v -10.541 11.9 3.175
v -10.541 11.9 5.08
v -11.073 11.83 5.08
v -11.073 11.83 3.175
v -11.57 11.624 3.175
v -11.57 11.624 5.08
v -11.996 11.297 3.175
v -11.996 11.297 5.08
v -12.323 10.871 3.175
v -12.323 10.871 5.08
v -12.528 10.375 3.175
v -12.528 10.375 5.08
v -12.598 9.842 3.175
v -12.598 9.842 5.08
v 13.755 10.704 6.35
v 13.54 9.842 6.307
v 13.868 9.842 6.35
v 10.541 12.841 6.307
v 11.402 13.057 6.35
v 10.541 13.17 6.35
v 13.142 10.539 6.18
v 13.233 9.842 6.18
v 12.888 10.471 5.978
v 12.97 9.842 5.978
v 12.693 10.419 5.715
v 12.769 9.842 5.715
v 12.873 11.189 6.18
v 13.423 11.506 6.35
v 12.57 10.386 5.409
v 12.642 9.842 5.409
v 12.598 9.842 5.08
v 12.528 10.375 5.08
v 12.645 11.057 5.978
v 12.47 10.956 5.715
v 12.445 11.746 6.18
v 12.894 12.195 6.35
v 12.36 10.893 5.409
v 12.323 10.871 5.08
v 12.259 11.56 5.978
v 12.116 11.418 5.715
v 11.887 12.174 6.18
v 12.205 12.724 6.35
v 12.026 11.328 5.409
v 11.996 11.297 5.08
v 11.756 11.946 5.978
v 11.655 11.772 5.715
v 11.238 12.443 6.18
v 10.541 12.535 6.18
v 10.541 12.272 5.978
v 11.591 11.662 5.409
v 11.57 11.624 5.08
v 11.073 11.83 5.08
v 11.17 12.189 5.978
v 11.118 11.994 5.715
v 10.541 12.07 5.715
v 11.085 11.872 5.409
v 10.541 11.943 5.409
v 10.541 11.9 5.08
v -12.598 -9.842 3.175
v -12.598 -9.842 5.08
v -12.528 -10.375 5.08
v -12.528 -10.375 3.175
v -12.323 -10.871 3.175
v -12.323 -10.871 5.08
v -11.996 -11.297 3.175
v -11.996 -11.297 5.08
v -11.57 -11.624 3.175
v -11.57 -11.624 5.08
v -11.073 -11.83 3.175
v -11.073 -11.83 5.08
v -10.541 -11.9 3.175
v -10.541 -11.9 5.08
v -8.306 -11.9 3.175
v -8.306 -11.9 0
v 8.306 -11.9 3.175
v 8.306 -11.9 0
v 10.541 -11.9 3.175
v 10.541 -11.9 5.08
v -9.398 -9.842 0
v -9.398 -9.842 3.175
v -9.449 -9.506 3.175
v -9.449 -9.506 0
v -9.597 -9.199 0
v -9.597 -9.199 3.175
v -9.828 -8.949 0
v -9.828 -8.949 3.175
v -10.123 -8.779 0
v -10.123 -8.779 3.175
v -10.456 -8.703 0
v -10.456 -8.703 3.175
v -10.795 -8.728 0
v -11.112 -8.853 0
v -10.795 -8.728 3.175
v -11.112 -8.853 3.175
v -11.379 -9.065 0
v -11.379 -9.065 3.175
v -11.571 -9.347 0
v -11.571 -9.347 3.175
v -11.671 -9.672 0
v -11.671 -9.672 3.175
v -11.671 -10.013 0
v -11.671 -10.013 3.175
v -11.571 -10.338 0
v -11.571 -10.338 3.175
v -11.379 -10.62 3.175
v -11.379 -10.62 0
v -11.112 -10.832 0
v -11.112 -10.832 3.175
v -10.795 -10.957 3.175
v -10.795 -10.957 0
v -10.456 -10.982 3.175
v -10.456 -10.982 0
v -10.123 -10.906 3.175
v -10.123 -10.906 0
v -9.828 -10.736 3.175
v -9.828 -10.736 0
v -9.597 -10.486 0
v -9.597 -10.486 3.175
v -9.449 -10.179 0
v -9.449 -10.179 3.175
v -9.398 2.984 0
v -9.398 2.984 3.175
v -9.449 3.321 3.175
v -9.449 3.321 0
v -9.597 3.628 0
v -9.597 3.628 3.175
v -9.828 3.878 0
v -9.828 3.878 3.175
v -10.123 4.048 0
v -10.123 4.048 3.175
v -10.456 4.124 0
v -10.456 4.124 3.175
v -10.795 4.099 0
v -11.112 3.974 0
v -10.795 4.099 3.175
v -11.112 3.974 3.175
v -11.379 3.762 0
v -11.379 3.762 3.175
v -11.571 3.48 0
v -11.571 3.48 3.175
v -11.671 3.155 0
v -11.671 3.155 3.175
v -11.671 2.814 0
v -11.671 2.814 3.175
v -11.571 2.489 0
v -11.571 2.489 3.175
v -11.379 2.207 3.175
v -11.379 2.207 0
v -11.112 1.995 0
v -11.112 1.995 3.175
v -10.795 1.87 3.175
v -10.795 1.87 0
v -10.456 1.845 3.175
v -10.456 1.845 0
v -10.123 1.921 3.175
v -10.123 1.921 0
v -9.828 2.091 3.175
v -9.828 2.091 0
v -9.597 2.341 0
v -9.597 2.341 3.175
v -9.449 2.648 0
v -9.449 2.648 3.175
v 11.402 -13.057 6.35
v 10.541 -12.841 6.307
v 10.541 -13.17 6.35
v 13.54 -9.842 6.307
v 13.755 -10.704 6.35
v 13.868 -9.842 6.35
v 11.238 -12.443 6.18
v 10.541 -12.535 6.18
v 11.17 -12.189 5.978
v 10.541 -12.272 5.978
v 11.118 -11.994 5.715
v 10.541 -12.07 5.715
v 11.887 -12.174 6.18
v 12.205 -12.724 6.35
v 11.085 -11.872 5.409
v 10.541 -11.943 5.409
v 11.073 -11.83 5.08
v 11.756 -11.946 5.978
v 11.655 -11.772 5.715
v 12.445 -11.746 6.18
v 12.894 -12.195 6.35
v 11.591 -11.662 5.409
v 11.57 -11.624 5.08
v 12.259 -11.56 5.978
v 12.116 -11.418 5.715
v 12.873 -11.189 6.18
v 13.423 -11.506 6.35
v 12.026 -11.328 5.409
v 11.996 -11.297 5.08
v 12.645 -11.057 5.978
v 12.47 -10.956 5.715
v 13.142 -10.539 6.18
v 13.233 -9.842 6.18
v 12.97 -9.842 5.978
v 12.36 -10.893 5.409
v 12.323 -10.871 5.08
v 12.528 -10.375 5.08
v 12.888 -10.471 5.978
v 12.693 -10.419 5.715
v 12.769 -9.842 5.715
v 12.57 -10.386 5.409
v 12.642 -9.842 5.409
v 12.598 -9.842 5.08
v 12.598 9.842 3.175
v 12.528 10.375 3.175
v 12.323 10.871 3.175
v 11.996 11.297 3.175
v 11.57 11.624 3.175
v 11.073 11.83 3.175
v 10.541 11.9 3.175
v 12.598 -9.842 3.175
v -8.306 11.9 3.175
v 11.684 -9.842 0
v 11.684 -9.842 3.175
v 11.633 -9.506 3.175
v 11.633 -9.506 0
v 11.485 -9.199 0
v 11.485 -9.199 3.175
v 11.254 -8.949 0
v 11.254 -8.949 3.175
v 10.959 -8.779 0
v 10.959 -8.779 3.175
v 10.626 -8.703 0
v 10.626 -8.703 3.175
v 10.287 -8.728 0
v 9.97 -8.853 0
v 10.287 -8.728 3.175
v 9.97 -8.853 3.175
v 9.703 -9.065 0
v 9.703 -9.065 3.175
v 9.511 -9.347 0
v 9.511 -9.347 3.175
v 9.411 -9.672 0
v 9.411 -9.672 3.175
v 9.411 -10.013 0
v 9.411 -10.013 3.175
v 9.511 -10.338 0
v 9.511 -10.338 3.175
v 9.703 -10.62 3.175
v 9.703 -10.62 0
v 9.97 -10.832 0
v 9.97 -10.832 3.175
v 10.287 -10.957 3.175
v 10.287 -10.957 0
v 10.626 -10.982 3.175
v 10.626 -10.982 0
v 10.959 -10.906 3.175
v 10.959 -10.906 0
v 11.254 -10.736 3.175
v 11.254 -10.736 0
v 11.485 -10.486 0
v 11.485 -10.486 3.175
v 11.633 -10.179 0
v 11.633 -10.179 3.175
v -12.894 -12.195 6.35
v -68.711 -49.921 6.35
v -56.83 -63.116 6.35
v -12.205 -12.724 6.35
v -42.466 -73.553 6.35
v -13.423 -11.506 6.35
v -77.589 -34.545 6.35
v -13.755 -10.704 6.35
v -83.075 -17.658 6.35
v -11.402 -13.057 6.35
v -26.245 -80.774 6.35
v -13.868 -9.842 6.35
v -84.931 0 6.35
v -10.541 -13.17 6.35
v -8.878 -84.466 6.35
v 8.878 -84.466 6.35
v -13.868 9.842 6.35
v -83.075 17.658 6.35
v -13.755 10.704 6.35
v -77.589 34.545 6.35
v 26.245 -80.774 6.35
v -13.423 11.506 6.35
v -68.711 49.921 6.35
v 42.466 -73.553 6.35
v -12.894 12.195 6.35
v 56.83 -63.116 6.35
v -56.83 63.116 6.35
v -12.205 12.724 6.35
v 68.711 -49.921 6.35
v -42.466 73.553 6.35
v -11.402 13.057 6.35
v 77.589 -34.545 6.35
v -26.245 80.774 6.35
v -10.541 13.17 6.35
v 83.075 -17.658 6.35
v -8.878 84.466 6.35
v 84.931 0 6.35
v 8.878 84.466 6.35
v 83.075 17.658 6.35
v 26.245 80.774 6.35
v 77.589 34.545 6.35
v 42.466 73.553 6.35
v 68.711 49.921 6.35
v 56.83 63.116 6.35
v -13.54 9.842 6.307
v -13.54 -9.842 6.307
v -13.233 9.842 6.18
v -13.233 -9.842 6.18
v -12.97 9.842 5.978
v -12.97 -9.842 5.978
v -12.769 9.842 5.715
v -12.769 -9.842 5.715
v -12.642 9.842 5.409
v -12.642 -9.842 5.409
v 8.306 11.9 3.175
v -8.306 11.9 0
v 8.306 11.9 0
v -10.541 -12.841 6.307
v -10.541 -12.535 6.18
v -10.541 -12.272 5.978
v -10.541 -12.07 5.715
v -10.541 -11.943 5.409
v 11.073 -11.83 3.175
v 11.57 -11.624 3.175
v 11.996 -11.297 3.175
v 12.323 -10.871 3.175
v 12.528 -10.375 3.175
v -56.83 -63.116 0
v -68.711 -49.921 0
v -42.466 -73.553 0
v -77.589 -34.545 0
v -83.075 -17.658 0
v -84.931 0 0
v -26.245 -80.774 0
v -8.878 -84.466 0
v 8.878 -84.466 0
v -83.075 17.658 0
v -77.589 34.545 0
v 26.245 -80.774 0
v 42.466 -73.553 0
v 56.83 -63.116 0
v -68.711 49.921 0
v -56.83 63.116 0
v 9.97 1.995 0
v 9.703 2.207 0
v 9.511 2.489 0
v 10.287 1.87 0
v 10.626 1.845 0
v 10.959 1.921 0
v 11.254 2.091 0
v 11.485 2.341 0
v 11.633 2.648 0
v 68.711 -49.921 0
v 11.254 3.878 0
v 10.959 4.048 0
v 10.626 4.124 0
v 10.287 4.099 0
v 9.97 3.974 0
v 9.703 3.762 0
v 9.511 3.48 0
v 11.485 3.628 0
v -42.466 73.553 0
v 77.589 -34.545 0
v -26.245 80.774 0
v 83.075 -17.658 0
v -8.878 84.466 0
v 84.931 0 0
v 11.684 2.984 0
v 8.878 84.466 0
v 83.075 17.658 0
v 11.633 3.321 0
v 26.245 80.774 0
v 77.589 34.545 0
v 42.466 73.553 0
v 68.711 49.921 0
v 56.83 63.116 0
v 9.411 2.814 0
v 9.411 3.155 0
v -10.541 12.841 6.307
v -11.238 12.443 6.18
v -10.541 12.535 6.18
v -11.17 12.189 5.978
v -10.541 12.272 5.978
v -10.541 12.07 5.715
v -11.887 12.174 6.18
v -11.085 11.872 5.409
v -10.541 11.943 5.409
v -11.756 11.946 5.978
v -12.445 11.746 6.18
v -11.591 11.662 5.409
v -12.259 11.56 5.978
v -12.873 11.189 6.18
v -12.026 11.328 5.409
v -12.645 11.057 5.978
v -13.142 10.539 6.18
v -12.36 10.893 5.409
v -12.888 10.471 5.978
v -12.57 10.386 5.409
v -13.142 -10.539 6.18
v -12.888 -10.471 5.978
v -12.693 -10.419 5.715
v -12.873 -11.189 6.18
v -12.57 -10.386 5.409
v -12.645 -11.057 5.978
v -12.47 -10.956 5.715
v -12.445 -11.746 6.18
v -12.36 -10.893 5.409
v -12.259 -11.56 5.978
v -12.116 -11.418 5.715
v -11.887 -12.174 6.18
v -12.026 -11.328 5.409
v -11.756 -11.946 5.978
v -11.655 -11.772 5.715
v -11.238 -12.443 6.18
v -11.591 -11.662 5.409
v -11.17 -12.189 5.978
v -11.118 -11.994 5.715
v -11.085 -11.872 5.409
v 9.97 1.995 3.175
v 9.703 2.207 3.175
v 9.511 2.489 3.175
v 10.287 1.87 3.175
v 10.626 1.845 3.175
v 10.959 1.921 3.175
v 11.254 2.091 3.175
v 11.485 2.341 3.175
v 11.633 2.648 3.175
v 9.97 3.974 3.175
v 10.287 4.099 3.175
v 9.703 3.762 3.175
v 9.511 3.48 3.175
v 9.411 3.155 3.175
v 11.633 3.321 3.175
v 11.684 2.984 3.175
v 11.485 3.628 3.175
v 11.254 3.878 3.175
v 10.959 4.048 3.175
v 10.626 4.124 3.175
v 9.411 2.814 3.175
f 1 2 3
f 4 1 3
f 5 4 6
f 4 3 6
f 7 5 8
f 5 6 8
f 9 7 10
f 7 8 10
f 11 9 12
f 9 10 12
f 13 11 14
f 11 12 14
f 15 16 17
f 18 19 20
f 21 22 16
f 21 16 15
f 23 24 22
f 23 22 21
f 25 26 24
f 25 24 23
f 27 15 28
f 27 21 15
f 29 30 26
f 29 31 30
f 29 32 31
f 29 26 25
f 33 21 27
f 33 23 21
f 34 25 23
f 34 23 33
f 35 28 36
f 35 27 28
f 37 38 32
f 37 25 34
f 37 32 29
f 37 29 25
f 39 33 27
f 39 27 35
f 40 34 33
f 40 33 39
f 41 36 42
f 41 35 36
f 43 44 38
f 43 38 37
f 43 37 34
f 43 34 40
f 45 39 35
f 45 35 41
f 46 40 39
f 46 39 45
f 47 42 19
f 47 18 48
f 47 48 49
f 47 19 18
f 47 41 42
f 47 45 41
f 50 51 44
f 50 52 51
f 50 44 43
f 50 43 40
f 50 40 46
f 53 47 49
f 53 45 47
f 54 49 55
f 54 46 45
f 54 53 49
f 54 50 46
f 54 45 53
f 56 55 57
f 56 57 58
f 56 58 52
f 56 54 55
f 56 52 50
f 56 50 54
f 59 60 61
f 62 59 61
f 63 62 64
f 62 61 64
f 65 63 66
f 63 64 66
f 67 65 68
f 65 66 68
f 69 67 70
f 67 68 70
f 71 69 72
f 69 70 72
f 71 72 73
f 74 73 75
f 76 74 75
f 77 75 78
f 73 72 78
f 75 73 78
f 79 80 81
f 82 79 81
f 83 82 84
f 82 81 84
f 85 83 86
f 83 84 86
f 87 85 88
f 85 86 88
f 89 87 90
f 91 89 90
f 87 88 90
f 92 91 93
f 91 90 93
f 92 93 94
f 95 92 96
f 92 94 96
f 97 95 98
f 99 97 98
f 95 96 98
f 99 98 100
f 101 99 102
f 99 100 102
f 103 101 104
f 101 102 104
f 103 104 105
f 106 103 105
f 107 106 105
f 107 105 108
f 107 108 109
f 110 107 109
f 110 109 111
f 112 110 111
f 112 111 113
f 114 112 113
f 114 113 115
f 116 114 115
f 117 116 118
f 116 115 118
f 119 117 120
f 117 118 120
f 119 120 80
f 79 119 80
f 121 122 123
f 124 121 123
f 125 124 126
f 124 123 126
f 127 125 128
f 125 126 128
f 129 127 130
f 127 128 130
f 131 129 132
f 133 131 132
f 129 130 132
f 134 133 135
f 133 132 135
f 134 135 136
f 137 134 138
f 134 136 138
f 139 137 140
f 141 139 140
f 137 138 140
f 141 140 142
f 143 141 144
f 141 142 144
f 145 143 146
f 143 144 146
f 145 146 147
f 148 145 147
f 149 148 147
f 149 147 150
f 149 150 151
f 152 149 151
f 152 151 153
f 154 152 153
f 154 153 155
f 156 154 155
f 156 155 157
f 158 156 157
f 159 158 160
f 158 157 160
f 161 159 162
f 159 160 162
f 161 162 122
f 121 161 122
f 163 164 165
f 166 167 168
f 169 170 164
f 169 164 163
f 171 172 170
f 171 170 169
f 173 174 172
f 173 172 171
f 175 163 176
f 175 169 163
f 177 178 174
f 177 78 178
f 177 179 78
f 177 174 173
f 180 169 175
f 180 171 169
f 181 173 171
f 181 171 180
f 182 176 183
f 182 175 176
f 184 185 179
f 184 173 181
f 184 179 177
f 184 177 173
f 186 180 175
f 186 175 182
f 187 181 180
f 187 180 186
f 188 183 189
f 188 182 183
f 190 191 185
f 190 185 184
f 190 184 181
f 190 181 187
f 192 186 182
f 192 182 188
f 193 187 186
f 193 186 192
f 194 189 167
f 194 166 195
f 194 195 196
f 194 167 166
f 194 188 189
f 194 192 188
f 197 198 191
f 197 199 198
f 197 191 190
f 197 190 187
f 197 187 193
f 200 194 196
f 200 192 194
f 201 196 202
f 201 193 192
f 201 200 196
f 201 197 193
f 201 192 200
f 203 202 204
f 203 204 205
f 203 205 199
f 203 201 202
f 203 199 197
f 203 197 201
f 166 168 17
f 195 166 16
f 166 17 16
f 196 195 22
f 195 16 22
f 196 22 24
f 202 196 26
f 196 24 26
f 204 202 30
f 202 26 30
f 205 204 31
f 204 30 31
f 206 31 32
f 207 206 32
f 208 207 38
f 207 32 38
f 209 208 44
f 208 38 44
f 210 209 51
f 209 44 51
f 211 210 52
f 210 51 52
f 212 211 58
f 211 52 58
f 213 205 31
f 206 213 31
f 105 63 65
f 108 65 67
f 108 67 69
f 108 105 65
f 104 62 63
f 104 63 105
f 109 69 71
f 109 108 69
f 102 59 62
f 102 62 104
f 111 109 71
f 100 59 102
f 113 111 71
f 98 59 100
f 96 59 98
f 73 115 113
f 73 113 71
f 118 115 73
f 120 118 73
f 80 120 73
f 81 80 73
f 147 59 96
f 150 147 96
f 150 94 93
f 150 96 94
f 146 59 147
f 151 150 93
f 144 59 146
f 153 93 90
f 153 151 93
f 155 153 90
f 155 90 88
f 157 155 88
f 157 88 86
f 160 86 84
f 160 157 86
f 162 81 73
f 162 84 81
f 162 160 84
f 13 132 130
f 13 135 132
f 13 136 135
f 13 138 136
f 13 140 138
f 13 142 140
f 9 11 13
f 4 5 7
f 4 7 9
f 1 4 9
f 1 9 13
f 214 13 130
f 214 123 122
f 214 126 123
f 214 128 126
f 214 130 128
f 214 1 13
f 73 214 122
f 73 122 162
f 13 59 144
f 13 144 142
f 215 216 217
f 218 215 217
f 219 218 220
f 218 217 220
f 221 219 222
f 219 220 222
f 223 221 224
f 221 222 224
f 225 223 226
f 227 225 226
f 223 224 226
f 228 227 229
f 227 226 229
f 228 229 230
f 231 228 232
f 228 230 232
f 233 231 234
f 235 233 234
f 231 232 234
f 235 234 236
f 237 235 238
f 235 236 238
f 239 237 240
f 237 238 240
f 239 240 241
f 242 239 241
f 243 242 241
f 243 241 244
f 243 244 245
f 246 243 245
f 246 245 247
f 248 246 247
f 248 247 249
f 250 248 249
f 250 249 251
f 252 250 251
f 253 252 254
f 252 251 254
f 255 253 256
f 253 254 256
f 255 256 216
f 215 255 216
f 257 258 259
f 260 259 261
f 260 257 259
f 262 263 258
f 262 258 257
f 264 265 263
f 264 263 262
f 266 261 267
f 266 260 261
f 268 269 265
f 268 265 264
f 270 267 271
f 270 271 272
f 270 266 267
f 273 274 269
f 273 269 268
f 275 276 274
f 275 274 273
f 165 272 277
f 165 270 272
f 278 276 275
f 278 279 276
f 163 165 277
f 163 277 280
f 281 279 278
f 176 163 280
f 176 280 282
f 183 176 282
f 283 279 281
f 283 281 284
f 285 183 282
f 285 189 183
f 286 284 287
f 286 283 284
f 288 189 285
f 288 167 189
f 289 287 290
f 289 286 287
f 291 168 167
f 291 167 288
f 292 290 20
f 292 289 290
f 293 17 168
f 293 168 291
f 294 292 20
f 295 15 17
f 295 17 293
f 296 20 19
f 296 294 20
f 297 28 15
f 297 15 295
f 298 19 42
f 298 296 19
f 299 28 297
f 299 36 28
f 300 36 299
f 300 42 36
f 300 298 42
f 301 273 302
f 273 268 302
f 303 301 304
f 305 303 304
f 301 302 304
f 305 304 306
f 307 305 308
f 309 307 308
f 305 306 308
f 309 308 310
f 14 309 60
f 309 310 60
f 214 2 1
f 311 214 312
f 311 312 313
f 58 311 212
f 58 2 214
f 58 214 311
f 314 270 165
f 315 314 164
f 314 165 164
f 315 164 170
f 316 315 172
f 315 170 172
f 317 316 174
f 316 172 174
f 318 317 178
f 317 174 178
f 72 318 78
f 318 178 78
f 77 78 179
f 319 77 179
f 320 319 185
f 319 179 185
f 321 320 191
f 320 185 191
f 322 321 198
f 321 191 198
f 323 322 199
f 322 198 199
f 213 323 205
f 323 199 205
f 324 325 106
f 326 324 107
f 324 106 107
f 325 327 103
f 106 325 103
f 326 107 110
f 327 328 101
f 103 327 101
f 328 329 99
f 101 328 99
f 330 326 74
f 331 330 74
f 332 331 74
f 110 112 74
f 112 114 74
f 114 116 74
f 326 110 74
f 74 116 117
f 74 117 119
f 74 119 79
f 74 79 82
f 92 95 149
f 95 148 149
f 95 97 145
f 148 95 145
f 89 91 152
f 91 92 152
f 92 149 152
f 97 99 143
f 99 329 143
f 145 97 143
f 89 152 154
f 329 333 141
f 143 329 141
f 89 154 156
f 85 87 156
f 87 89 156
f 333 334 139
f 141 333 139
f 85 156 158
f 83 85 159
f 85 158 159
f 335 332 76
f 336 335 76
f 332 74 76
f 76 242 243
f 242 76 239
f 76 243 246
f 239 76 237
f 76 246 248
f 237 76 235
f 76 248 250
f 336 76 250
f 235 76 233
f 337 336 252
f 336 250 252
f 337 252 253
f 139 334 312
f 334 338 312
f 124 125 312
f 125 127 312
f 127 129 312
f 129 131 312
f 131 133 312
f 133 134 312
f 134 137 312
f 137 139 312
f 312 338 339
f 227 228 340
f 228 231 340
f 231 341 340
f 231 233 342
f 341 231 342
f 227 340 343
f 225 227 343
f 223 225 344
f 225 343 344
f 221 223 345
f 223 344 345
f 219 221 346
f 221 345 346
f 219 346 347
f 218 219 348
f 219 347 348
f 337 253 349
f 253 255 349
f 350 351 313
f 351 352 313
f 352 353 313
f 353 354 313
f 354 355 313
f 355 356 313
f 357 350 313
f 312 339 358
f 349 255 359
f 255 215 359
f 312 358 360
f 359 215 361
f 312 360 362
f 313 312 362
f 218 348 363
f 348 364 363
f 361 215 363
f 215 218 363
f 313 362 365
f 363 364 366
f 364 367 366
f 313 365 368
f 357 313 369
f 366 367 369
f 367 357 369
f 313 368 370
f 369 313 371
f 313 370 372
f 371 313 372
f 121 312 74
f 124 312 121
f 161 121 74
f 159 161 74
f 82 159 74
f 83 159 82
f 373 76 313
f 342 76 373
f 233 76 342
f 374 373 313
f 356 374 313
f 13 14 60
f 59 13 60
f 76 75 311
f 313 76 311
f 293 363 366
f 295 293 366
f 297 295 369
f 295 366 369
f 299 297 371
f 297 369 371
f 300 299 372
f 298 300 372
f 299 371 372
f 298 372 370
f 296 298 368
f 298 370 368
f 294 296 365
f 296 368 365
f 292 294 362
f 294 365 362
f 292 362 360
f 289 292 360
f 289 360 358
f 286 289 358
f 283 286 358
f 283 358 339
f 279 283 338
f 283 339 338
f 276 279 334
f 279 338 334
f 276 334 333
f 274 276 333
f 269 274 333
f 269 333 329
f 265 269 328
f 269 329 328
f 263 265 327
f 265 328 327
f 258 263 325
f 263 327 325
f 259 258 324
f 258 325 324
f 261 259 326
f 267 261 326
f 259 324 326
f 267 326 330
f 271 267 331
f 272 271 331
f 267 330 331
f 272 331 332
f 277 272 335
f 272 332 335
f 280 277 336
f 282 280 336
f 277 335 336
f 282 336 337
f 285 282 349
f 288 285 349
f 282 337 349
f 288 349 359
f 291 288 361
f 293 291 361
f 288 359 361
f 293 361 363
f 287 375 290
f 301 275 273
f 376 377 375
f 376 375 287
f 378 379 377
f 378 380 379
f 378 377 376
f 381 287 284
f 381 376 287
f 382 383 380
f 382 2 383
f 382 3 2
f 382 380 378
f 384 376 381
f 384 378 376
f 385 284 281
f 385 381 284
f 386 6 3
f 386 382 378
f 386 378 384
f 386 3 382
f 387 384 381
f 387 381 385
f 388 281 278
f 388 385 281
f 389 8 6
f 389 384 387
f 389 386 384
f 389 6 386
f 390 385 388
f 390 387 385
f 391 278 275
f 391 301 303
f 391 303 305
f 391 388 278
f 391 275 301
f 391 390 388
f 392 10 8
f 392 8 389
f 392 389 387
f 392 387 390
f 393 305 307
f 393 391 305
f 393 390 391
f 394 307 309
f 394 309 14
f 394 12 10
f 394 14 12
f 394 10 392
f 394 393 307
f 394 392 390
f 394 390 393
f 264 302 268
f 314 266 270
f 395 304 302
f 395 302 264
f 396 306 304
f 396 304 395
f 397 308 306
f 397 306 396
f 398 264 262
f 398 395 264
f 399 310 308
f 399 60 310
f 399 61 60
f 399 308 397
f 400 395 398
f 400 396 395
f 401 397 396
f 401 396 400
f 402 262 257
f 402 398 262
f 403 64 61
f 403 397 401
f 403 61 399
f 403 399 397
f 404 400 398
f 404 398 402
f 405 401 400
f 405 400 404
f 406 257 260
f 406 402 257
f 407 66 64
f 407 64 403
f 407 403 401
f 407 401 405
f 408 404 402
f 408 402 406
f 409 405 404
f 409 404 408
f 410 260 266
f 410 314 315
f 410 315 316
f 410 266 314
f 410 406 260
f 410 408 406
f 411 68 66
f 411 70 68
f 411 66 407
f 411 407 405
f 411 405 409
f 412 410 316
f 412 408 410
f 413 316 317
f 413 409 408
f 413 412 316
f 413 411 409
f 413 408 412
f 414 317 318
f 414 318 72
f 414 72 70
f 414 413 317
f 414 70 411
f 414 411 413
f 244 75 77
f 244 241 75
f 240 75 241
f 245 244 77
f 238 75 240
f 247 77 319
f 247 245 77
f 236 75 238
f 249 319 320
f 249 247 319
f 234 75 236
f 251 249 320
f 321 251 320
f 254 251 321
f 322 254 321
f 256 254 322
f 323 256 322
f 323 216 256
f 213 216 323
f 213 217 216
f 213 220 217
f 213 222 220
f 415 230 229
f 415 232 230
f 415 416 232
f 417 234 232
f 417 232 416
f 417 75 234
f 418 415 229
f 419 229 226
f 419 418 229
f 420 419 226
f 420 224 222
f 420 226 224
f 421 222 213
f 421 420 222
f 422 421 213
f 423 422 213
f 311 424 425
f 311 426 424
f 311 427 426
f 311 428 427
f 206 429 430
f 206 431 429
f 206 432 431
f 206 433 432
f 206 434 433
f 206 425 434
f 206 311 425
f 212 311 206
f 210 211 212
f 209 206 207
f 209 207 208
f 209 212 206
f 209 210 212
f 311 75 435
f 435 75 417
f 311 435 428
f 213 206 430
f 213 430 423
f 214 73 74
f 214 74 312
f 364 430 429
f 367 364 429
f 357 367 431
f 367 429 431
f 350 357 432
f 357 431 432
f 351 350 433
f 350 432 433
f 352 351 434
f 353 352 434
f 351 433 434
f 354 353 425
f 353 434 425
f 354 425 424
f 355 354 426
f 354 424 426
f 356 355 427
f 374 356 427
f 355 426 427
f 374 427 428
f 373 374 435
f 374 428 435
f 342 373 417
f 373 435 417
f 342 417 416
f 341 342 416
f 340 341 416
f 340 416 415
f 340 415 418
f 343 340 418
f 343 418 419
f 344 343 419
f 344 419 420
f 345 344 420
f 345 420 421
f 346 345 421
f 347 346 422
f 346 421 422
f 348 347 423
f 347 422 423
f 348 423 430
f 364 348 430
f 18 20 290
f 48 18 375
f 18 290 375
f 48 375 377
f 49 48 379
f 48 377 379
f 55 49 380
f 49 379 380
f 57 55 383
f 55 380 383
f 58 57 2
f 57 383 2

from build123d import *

# Parameters (mm, degrees)
SKETCH1_R           = 84.93125
BOSS_EXTRUDE1_DEPTH = 6.35
CUT_EXTRUDE2_DEPTH  = 3.175
SKETCH4_R           = 1.143
SKETCH4_W           = 16.6116
SKETCH4_H           = 23.7998
CUT_EXTRUDE3_DEPTH  = 3.175
FILLET1_R           = 1.27


with BuildPart() as part:
    # Sketch1 → Boss-Extrude1 (new body)
    with BuildSketch(Plane.XY):
        Circle(SKETCH1_R)
    extrude(amount=BOSS_EXTRUDE1_DEPTH)

    # Sketch2 → Cut-Extrude2 (cut)
    with BuildSketch(Plane.XY.offset(6.35)):
        with BuildLine():
            Line((10.541, 11.8999), (-10.541, 11.8999))
            ThreePointArc((-10.541, 11.8999), (-11.995801492, 11.297301492), (-12.5984, 9.8425))
            Line((-12.5984, 9.8425), (-12.5984, -9.8425))
            ThreePointArc((-12.5984, -9.8425), (-11.995801492, -11.297301492), (-10.541, -11.8999))
            Line((-10.541, -11.8999), (10.541, -11.8999))
            ThreePointArc((10.541, -11.8999), (11.995801492, -11.297301492), (12.5984, -9.8425))
            Line((12.5984, -9.8425), (12.5984, 9.8425))
            ThreePointArc((12.5984, 9.8425), (11.995801492, 11.297301492), (10.541, 11.8999))
        make_face()
    extrude(amount=-CUT_EXTRUDE2_DEPTH, mode=Mode.SUBTRACT)

    # Sketch4 → Cut-Extrude3 (cut)
    with BuildSketch(Plane.XY.offset(3.175)):
        with Locations((10.541, -9.8425)):
            Circle(SKETCH4_R)
        with Locations((-10.541, -9.8425)):
            Circle(SKETCH4_R)
        with Locations((10.541, 2.9845)):
            Circle(SKETCH4_R)
        with Locations((-10.541, 2.9845)):
            Circle(SKETCH4_R)
        Rectangle(SKETCH4_W, SKETCH4_H)
    extrude(amount=-CUT_EXTRUDE3_DEPTH, mode=Mode.SUBTRACT)

    # Fillet1
    fillet1_edges = [part.edges().sort_by_distance(p)[0] for p in [
        (-12.5984, 0, 6.35),
        (11.995801492, -11.297301492, 6.35),
        (12.5984, 0, 6.35),
        (11.995801492, 11.297301492, 6.35),
        (-11.995801492, -11.297301492, 6.35),
        (0, -11.8999, 6.35),
        (0, 11.8999, 6.35),
        (-11.995801492, 11.297301492, 6.35),
    ]]
    fillet(fillet1_edges, radius=FILLET1_R)


solid = part.part
